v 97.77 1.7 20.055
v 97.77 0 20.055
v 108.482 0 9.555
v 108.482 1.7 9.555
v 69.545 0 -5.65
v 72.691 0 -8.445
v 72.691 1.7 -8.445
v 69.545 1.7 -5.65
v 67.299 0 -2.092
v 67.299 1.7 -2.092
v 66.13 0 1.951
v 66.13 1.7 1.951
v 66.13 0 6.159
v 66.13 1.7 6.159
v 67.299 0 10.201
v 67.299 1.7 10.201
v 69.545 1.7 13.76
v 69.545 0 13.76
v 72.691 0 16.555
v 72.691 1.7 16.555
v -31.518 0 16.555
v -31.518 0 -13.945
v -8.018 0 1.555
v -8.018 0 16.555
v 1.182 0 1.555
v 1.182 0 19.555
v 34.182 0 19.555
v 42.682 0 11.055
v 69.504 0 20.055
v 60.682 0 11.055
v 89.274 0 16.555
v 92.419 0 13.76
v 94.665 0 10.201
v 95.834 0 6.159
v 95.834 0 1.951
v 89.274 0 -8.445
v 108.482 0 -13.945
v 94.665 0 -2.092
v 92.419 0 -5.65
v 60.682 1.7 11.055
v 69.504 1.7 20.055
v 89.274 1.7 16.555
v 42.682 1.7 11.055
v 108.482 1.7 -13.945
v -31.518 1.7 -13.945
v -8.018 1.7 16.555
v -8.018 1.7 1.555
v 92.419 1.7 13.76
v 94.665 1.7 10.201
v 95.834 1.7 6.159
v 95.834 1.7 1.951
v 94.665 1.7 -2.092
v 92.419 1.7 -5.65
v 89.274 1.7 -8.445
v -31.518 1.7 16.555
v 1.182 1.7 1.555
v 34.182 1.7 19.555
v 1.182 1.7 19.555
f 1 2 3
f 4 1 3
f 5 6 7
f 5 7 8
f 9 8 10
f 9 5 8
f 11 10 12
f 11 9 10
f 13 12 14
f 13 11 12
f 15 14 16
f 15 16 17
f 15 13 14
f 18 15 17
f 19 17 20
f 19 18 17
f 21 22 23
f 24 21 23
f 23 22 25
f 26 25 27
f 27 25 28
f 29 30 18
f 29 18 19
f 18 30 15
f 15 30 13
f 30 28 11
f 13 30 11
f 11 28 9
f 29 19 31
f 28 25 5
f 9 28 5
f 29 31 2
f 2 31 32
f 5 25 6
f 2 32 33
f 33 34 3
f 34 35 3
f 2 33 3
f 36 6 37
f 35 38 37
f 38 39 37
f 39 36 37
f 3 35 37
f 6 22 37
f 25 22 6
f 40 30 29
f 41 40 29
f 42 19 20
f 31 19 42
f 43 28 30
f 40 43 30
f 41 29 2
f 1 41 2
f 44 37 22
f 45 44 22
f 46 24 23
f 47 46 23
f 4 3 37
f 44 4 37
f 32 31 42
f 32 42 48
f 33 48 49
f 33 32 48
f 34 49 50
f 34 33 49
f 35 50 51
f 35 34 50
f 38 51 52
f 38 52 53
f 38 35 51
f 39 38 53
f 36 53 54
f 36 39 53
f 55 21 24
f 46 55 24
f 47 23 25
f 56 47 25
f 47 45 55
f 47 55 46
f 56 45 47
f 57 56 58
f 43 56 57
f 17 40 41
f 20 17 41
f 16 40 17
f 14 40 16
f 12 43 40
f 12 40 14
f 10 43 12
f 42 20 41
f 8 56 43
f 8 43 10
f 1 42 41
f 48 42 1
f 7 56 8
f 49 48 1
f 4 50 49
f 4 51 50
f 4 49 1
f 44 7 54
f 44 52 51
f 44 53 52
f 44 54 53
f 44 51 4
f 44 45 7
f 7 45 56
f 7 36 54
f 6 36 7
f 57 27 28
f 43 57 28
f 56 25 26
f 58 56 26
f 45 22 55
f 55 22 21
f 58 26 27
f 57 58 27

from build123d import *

# Parameters (mm, degrees)
BOSS_EXTRUDE1_DEPTH = 1.7


with BuildPart() as part:
    # Sketch1 → Boss-Extrude1 (new body)
    with BuildSketch(Plane(origin=(0, 0, 0), x_dir=(1, 0, 0), z_dir=(0, 1, 0))):
        Polygon((-8.017928363, -16.55461165), (-8.017928363, -1.55461165), (1.182071637, -1.55461165), (1.182071637, -19.55461165), (34.182071637, -19.55461165), (42.682071637, -11.05461165), (60.682071637, -11.05461165), (69.503836167, -20.05461165), (97.769928994, -20.05461165), (108.482071637, -9.55461165), (108.482071637, 13.94538835), (-31.517928363, 13.94538835), (-31.517928363, -16.55461165), align=None)
        with BuildLine():
            ThreePointArc((72.690509661, 8.44538835), (65.982071637, -4.05461165), (72.690509661, -16.55461165))
            Line((72.690509661, -16.55461165), (89.273633613, -16.55461165))
            ThreePointArc((89.273633613, -16.55461165), (95.982071637, -4.05461165), (89.273633613, 8.44538835))
            Line((89.273633613, 8.44538835), (72.690509661, 8.44538835))
        make_face(mode=Mode.SUBTRACT)
    extrude(amount=BOSS_EXTRUDE1_DEPTH)


solid = part.part
